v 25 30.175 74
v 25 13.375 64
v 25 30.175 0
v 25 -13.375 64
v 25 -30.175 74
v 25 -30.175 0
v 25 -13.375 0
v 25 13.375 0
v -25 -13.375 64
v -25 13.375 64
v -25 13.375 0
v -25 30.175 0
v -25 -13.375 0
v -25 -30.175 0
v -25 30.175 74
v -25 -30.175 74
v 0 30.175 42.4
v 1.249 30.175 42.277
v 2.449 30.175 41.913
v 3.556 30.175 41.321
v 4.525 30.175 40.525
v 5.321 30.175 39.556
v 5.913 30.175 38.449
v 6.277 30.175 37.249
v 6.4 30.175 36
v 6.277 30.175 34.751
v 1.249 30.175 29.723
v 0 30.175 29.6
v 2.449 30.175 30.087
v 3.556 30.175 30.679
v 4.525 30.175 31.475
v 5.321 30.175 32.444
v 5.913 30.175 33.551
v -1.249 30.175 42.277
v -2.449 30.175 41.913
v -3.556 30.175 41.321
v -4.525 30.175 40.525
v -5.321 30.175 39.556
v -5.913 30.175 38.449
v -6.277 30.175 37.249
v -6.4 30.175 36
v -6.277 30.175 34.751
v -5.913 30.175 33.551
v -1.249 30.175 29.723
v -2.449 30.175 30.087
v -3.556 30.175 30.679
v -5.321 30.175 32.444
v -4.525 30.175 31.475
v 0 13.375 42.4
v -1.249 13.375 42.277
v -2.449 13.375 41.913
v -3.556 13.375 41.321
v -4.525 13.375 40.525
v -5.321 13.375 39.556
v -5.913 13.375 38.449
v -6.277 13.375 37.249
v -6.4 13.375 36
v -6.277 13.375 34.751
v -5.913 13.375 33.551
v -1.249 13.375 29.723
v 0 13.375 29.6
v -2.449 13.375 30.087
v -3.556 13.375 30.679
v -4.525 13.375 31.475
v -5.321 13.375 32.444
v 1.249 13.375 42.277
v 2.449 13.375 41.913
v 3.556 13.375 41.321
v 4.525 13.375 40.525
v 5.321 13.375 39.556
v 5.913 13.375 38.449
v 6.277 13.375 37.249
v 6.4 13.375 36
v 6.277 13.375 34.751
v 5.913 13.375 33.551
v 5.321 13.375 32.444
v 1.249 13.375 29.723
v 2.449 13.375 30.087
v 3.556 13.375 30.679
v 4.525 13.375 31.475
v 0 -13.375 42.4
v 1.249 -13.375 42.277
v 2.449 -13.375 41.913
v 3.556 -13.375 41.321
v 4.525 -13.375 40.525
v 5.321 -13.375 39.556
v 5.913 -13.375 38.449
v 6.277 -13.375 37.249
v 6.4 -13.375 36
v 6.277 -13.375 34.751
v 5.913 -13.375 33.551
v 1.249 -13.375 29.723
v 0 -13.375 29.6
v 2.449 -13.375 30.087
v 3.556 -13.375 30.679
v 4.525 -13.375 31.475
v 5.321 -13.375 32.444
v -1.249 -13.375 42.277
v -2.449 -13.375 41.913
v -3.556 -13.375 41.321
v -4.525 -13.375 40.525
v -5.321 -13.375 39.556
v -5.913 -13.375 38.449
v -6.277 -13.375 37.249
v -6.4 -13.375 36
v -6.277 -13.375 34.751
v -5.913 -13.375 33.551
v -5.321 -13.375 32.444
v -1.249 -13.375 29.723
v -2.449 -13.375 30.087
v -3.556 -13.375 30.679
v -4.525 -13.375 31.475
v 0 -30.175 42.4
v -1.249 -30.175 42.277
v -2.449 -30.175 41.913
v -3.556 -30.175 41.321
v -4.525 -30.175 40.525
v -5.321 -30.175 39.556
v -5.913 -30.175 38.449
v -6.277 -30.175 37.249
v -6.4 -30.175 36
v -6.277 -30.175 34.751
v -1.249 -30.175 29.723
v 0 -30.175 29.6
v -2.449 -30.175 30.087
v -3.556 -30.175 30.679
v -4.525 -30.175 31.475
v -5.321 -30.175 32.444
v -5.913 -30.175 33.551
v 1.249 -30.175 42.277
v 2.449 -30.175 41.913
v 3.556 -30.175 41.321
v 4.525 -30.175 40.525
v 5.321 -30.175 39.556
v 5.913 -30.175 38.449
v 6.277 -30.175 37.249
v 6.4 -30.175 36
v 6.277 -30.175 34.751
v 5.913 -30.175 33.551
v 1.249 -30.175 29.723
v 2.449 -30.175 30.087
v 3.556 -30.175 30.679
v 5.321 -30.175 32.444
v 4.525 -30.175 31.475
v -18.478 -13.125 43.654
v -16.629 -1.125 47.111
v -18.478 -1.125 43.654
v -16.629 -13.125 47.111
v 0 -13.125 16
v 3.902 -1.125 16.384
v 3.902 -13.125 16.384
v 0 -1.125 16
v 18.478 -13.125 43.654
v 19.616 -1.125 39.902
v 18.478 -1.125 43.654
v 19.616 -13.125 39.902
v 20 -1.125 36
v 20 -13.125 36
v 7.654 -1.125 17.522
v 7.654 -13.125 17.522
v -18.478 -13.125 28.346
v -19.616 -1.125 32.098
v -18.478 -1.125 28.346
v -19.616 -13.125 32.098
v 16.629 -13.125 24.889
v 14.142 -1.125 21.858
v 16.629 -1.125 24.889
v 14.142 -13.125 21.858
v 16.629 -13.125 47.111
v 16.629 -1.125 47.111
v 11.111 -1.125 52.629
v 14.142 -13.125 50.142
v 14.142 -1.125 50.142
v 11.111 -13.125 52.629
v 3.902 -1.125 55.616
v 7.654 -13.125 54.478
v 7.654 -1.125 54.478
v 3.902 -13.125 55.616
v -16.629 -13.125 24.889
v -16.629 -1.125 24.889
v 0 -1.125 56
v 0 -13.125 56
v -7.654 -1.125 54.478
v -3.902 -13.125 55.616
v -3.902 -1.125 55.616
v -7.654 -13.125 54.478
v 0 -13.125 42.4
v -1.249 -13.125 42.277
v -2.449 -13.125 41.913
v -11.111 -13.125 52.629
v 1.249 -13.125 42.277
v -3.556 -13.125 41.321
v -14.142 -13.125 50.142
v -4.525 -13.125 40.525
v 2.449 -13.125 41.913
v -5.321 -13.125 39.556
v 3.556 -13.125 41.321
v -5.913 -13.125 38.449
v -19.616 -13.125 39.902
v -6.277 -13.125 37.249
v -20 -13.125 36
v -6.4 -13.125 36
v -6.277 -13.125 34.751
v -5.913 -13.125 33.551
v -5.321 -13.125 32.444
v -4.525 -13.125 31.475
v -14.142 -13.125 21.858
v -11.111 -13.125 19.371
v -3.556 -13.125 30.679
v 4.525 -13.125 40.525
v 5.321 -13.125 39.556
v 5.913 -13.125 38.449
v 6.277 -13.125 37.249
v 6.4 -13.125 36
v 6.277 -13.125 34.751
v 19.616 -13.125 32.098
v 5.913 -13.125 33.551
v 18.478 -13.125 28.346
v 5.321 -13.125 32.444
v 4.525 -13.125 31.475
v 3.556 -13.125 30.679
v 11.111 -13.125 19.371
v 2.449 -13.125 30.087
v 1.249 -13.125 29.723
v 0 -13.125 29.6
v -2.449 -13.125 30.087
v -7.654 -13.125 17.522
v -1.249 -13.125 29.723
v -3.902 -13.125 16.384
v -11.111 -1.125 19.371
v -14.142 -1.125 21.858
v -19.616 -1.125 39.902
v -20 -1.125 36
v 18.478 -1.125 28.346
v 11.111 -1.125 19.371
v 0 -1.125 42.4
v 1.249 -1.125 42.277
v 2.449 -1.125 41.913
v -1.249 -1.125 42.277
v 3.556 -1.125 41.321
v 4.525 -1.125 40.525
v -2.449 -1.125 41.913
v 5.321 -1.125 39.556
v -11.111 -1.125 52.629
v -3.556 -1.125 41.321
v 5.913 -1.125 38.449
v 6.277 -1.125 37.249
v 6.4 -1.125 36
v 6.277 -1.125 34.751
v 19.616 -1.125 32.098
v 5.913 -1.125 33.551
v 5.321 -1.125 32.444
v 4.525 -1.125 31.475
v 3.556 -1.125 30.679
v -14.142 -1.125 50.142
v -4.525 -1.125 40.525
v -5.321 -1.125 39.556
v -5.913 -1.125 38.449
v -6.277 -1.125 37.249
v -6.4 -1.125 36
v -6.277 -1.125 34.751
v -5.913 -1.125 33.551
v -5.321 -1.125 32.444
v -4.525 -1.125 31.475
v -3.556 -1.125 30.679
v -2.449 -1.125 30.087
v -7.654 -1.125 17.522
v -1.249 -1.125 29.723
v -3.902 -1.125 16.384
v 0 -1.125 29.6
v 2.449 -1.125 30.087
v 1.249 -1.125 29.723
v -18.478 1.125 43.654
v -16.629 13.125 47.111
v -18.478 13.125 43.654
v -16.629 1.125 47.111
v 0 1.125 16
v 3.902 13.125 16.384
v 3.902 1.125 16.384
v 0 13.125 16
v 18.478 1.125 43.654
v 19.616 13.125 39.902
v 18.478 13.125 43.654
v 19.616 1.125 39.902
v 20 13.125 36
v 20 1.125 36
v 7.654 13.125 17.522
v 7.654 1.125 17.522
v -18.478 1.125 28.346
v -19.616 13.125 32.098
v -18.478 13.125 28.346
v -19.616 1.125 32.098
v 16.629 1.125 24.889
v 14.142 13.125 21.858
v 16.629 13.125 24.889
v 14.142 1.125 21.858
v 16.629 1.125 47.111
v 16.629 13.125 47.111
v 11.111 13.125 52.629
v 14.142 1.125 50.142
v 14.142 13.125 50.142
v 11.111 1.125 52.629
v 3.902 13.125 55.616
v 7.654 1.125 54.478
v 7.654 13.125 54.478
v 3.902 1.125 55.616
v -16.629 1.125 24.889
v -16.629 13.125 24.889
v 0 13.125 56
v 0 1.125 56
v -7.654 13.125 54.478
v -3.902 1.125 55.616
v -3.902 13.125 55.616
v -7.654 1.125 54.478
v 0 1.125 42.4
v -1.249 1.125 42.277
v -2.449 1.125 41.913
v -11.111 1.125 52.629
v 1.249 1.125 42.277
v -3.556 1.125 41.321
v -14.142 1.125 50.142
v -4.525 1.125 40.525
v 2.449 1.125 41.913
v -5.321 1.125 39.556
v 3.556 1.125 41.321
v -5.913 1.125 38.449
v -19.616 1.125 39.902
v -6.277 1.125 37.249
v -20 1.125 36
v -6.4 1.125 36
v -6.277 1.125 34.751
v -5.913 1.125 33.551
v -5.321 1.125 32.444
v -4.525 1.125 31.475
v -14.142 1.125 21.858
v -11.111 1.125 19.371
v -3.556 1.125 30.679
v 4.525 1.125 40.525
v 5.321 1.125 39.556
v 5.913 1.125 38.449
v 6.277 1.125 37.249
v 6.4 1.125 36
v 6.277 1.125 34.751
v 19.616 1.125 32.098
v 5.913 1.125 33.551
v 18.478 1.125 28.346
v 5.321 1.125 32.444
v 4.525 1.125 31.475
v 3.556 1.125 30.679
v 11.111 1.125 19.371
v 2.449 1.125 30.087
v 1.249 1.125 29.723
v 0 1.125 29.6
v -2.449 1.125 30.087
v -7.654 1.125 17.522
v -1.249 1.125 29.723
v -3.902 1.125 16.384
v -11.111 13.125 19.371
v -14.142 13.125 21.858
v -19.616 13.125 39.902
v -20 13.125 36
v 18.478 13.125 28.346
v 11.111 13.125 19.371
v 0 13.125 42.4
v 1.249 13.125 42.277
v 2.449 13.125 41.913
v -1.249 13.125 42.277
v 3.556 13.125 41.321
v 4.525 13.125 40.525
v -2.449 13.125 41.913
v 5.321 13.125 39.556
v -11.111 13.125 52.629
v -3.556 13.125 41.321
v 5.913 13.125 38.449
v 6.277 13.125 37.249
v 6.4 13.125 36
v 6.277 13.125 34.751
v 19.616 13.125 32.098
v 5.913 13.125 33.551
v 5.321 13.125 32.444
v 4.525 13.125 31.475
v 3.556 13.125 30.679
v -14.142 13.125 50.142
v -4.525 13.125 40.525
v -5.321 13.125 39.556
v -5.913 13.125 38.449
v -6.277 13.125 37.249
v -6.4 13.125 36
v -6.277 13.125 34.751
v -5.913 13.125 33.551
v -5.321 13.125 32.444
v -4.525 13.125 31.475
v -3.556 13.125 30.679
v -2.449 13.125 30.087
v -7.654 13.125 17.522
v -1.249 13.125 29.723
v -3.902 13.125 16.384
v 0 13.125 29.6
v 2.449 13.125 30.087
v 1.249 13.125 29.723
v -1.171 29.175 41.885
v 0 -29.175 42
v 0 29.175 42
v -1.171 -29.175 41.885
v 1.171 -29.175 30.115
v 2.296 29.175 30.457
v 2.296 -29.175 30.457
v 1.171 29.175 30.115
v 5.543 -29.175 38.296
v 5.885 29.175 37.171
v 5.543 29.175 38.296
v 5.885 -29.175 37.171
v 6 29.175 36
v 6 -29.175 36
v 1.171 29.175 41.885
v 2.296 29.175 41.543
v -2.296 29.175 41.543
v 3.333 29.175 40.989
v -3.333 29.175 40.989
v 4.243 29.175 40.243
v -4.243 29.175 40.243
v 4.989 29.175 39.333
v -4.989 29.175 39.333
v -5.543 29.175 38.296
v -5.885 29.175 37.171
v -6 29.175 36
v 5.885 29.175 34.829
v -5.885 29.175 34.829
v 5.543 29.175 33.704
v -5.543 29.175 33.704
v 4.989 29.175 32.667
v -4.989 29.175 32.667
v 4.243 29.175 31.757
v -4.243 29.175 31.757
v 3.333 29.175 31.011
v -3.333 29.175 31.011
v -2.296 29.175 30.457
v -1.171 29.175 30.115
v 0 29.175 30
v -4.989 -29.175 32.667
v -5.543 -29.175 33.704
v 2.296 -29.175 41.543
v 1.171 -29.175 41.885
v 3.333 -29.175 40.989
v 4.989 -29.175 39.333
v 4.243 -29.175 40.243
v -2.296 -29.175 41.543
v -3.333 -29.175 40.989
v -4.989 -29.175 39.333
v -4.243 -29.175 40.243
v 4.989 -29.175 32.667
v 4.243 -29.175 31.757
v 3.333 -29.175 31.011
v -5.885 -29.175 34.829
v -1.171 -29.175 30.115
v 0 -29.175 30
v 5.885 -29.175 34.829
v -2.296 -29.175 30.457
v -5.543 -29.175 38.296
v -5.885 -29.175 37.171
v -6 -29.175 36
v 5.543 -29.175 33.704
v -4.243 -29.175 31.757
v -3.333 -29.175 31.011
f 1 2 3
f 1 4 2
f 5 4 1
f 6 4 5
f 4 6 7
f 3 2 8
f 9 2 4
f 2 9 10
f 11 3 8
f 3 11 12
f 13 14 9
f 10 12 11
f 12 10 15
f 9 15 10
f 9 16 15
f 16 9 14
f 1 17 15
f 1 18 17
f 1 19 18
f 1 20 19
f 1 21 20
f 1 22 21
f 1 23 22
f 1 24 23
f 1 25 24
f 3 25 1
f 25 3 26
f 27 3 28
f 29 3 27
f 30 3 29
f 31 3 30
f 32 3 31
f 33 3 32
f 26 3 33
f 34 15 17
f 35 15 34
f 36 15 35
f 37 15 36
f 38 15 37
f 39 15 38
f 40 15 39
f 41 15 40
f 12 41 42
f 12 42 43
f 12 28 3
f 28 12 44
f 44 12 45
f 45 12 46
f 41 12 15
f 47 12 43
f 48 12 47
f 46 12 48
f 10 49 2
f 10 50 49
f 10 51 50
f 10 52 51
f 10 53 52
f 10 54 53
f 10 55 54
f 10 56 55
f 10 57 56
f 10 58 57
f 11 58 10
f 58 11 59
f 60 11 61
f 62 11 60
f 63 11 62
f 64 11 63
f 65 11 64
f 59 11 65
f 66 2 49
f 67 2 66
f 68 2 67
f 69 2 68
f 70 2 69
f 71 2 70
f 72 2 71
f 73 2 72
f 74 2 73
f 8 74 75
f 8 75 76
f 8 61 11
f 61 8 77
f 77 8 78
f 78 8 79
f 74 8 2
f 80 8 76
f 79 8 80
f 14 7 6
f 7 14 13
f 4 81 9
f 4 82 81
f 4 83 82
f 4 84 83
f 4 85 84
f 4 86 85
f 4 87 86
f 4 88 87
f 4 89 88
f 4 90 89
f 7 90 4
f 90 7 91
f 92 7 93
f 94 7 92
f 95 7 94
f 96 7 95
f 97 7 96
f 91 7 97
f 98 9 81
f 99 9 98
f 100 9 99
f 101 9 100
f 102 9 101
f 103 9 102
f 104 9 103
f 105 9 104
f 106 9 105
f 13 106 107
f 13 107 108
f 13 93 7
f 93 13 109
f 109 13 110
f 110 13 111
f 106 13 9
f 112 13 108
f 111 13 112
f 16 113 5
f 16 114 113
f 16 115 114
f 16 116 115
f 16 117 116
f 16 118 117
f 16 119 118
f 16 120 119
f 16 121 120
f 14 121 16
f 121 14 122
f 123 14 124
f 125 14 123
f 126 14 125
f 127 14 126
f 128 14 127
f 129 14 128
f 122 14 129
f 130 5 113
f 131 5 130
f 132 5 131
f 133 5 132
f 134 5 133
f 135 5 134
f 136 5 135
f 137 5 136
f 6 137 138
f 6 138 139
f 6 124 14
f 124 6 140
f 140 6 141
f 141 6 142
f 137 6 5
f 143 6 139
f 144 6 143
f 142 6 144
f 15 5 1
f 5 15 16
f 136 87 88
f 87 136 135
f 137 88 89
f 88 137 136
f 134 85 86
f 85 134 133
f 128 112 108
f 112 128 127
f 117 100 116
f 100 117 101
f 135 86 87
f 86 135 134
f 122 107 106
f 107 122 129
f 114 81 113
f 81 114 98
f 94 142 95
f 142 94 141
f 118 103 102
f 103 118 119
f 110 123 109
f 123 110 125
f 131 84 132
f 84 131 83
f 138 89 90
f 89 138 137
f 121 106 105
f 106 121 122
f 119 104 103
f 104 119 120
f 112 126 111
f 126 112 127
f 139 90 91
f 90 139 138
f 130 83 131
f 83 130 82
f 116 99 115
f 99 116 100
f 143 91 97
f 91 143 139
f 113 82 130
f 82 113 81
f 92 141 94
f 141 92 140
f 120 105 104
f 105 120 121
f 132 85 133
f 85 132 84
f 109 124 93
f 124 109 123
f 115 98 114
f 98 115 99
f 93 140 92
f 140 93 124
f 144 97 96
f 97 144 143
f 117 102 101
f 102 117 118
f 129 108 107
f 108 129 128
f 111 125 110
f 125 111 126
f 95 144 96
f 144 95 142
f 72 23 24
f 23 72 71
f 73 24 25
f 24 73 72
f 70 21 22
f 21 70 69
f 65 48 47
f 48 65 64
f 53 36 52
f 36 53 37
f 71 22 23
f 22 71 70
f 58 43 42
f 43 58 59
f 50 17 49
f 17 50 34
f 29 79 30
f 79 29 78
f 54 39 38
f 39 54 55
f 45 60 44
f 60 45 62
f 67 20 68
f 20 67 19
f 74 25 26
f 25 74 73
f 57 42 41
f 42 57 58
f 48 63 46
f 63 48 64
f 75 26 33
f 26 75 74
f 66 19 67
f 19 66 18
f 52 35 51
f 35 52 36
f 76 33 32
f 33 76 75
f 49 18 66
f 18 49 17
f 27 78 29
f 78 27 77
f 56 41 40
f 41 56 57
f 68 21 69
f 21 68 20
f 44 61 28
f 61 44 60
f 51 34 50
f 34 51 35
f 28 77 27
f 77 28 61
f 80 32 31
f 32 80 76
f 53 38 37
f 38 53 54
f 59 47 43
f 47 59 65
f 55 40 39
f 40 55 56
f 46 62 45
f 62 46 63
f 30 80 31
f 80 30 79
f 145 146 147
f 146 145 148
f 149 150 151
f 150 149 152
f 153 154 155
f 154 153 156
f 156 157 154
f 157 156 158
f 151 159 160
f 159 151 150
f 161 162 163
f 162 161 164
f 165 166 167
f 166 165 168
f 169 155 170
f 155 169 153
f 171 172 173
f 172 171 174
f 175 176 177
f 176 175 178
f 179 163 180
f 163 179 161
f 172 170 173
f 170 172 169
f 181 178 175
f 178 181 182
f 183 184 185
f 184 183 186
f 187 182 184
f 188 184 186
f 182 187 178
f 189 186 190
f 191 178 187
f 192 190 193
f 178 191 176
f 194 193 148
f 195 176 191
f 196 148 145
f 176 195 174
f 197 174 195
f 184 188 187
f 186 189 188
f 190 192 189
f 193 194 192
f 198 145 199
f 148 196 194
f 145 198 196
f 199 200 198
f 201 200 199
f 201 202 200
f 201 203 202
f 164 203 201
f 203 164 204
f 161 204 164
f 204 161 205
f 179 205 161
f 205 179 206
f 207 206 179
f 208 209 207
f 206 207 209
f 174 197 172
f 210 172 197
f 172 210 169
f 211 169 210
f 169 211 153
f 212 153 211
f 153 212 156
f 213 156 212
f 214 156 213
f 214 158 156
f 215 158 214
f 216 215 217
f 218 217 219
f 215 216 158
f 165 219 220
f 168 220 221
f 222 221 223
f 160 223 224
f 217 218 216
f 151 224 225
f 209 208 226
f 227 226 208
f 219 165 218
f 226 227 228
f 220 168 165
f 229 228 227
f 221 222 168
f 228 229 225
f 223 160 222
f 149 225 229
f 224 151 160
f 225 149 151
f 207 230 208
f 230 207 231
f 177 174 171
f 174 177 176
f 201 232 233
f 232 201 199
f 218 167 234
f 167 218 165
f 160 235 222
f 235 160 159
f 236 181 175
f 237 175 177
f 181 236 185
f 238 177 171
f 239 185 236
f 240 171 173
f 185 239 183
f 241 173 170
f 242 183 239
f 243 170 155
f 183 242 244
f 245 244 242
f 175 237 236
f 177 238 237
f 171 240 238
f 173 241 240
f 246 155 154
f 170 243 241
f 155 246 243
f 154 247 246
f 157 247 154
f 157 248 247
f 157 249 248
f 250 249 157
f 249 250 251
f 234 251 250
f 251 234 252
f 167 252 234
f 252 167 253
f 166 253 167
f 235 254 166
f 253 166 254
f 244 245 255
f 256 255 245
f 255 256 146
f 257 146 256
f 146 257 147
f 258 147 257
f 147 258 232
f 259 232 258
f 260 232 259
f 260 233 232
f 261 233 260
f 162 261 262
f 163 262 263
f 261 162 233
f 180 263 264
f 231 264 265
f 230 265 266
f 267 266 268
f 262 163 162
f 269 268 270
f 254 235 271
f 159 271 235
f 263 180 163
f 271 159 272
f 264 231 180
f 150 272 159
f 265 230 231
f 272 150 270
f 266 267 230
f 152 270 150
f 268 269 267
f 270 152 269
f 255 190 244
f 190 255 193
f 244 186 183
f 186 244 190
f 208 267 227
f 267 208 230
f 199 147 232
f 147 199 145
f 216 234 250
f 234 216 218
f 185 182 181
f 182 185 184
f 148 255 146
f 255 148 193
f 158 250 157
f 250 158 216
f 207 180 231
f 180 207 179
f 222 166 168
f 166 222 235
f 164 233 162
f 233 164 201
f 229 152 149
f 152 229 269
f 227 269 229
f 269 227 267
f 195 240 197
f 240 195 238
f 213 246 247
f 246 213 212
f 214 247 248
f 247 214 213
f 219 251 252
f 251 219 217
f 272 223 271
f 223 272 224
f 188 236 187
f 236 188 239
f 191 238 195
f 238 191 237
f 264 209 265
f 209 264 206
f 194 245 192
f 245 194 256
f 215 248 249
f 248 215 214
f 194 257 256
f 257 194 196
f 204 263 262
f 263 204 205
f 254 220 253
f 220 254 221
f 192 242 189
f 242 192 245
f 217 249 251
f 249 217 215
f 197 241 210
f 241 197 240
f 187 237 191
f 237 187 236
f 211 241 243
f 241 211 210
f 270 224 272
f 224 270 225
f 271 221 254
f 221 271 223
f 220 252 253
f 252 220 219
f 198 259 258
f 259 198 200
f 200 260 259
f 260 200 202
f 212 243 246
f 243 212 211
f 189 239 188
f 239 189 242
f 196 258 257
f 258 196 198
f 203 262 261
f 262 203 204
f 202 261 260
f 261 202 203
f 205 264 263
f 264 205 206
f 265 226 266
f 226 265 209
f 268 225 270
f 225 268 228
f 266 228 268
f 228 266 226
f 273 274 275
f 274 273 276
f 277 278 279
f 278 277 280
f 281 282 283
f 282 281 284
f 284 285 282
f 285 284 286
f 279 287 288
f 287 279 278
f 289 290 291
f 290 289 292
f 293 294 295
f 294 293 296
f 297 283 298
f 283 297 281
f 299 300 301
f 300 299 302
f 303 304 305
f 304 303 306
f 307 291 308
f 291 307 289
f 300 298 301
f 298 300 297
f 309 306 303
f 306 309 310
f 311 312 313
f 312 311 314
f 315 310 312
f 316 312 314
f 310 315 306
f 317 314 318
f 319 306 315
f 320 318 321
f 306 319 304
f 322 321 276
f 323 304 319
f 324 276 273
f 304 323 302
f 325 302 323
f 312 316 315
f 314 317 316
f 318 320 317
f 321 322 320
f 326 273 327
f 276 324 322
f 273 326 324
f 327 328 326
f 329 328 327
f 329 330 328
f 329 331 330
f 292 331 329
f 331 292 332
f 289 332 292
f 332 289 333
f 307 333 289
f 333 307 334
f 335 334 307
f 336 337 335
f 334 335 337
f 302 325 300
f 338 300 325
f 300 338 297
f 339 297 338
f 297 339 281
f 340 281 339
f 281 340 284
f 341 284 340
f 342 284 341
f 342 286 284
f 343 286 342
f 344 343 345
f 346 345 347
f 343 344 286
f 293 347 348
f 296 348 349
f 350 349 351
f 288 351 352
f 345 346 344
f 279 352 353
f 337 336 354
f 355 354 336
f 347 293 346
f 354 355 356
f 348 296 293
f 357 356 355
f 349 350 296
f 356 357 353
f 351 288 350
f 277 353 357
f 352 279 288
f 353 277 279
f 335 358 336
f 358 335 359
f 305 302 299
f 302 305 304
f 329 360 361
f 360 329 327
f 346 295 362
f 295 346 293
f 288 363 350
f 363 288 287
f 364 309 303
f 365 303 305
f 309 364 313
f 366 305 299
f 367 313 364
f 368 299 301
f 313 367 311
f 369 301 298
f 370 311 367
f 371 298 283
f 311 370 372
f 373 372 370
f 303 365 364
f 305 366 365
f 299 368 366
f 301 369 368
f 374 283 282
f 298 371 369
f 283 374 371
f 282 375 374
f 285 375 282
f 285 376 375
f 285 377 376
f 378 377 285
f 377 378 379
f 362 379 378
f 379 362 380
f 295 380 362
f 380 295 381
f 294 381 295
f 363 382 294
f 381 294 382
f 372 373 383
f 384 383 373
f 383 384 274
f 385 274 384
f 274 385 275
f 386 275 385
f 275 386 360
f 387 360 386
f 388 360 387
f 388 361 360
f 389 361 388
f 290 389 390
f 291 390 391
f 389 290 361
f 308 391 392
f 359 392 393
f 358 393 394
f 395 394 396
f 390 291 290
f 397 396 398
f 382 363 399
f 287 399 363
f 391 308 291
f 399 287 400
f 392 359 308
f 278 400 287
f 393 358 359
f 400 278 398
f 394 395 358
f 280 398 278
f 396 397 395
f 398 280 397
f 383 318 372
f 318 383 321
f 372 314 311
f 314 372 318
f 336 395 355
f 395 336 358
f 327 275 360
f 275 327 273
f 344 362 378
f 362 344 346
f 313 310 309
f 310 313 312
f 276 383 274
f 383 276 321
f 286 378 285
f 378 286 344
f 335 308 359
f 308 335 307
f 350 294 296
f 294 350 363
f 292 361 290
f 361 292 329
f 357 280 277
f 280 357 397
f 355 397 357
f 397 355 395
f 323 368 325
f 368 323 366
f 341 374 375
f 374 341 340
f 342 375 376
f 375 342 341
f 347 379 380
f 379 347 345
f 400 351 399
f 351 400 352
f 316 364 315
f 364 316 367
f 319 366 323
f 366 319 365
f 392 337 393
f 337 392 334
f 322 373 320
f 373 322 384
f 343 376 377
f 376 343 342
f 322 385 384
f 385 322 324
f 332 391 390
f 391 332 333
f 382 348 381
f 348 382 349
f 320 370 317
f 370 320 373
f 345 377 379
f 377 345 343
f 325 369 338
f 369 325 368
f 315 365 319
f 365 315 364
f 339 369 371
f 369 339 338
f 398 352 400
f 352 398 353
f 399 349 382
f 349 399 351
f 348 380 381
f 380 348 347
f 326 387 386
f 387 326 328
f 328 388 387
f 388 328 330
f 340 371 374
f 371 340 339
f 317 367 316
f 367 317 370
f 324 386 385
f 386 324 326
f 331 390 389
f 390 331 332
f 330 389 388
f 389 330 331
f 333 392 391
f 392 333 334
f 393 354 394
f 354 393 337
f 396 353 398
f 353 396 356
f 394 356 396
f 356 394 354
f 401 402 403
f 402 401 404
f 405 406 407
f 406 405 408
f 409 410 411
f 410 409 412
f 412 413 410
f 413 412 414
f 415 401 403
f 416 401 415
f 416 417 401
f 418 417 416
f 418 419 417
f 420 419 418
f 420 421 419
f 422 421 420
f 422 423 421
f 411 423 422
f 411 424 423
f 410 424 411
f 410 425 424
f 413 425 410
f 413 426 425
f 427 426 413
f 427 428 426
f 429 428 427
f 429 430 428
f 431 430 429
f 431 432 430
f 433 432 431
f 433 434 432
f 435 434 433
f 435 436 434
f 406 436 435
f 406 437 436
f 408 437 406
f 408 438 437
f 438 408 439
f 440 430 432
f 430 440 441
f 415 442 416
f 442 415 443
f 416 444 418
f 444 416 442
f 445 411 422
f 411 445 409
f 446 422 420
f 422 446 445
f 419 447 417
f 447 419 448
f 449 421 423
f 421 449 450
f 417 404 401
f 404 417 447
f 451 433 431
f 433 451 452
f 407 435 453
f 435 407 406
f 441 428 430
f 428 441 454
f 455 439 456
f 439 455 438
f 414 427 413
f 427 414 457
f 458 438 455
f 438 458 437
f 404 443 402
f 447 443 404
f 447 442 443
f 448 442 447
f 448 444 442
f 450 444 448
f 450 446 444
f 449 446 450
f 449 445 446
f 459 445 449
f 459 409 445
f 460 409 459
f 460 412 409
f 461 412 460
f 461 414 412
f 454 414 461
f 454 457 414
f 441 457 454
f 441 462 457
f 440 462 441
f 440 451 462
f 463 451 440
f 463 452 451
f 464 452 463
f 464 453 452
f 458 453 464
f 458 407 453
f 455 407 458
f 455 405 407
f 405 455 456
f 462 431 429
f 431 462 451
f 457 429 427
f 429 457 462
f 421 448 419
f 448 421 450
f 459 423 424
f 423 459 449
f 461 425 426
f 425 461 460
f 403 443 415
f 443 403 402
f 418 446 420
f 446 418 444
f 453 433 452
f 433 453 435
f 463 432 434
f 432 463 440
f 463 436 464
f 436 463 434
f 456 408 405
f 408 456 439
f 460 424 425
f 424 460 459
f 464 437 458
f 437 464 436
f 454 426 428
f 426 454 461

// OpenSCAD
$fn = 32;

// ------------------------------------------------------------------------
// Trolley wheel set: wheels d40, fork 64 mm tall
// Every part is its own module, assembly() places every instance.
// ------------------------------------------------------------------------

// --- part 1 ---
module trolley_fork() {
  difference() {
    union() {
      translate([-25, 13.375, 0]) cube([50, 16.8, 64]);
      translate([-25, -30.175, 0]) cube([50, 16.8, 64]);
      translate([-25, -30.175, 64]) cube([50, 60.35, 10]);
    }
    translate([0, -21.775, 36]) rotate([90, 0, 0]) cylinder(h = 18.8, d = 12.8, center = true);
    translate([0, 21.775, 36]) rotate([90, 0, 0]) cylinder(h = 18.8, d = 12.8, center = true);
  }
}

// --- part 2 ---
module trolley_wheel() {
  difference() {
      translate([0, 0, 0]) cylinder(h = 12, d = 40);
      translate([0, 0, -1]) cylinder(h = 14, d = 12.8);
    }
}

// --- part 3 ---
module trolley_axle() {
  translate([0, 0, -29.175]) cylinder(h = 58.35, d = 12);
}

// --- assembly ---
module assembly() {
  color([0.80, 0.24, 0.20]) translate([0, 0, 0]) rotate([0, 0, 0]) trolley_fork();
  color([0.20, 0.45, 0.75]) translate([0, -1.125, 36]) rotate([90, 0, 0]) trolley_wheel();
  color([0.25, 0.62, 0.32]) translate([0, 13.125, 36]) rotate([90, 0, 0]) trolley_wheel();
  color([0.92, 0.70, 0.18]) translate([0, 0, 36]) rotate([90, 0, 0]) trolley_axle();
}

assembly();
